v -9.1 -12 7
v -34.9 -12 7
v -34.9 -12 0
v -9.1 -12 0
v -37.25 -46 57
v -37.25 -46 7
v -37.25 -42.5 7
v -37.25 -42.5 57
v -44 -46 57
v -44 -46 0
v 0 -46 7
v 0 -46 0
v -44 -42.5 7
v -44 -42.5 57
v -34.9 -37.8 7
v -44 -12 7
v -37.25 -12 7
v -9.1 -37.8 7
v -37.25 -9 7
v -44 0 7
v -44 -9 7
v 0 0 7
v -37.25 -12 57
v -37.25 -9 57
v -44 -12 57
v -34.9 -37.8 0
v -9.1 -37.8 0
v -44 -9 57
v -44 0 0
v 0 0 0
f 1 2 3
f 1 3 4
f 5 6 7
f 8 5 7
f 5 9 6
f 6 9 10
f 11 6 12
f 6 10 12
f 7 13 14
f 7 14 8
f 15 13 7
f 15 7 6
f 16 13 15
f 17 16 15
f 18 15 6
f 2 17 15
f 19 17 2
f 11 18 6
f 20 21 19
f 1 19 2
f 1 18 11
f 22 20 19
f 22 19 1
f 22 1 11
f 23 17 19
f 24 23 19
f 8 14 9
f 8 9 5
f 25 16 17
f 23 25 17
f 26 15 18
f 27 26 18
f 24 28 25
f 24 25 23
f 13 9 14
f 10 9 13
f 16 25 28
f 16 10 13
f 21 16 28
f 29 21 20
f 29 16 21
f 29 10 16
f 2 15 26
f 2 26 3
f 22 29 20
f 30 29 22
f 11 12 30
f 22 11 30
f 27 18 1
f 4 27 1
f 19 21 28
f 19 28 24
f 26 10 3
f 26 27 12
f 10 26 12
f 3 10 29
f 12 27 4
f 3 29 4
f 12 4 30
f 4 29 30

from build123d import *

# Parameters (mm, degrees)
SKETCH_W     = 44
SKETCH_H     = 46
PAD_DEPTH    = 7
SKETCH001_W  = 25.8
SKETCH001_H  = 25.8
POCKET_DEPTH = 8
SKETCH002_W  = 6.75
SKETCH002_H  = 3
PAD001_DEPTH = 50
SKETCH014_W  = 6.75
SKETCH014_H  = 3.5
PAD014_DEPTH = 50


with BuildPart() as part:
    # Sketch → Pad (new body)
    with BuildSketch(Plane.XY):
        with Locations((-22, -23)):
            Rectangle(SKETCH_W, SKETCH_H)
    extrude(amount=PAD_DEPTH)

    # Sketch001 (on Face6 of Pad) → Pocket (cut)
    with BuildSketch(Plane.XY.offset(7)):
        with Locations((-22, -24.9)):
            Rectangle(SKETCH001_W, SKETCH001_H)
    extrude(amount=-POCKET_DEPTH, mode=Mode.SUBTRACT)

    # Sketch002 (on Face5 of Pocket) → Pad001 (new body)
    with BuildSketch(Plane.XY.offset(7)):
        with Locations((-40.625, -10.5)):
            Rectangle(SKETCH002_W, SKETCH002_H)
    extrude(amount=PAD001_DEPTH)

    # Sketch014 (on Face5 of Pad001) → Pad014 (new body)
    with BuildSketch(Plane.XY.offset(7)):
        with Locations((-40.625, -44.25)):
            Rectangle(SKETCH014_W, SKETCH014_H)
    extrude(amount=PAD014_DEPTH)


solid = part.part
